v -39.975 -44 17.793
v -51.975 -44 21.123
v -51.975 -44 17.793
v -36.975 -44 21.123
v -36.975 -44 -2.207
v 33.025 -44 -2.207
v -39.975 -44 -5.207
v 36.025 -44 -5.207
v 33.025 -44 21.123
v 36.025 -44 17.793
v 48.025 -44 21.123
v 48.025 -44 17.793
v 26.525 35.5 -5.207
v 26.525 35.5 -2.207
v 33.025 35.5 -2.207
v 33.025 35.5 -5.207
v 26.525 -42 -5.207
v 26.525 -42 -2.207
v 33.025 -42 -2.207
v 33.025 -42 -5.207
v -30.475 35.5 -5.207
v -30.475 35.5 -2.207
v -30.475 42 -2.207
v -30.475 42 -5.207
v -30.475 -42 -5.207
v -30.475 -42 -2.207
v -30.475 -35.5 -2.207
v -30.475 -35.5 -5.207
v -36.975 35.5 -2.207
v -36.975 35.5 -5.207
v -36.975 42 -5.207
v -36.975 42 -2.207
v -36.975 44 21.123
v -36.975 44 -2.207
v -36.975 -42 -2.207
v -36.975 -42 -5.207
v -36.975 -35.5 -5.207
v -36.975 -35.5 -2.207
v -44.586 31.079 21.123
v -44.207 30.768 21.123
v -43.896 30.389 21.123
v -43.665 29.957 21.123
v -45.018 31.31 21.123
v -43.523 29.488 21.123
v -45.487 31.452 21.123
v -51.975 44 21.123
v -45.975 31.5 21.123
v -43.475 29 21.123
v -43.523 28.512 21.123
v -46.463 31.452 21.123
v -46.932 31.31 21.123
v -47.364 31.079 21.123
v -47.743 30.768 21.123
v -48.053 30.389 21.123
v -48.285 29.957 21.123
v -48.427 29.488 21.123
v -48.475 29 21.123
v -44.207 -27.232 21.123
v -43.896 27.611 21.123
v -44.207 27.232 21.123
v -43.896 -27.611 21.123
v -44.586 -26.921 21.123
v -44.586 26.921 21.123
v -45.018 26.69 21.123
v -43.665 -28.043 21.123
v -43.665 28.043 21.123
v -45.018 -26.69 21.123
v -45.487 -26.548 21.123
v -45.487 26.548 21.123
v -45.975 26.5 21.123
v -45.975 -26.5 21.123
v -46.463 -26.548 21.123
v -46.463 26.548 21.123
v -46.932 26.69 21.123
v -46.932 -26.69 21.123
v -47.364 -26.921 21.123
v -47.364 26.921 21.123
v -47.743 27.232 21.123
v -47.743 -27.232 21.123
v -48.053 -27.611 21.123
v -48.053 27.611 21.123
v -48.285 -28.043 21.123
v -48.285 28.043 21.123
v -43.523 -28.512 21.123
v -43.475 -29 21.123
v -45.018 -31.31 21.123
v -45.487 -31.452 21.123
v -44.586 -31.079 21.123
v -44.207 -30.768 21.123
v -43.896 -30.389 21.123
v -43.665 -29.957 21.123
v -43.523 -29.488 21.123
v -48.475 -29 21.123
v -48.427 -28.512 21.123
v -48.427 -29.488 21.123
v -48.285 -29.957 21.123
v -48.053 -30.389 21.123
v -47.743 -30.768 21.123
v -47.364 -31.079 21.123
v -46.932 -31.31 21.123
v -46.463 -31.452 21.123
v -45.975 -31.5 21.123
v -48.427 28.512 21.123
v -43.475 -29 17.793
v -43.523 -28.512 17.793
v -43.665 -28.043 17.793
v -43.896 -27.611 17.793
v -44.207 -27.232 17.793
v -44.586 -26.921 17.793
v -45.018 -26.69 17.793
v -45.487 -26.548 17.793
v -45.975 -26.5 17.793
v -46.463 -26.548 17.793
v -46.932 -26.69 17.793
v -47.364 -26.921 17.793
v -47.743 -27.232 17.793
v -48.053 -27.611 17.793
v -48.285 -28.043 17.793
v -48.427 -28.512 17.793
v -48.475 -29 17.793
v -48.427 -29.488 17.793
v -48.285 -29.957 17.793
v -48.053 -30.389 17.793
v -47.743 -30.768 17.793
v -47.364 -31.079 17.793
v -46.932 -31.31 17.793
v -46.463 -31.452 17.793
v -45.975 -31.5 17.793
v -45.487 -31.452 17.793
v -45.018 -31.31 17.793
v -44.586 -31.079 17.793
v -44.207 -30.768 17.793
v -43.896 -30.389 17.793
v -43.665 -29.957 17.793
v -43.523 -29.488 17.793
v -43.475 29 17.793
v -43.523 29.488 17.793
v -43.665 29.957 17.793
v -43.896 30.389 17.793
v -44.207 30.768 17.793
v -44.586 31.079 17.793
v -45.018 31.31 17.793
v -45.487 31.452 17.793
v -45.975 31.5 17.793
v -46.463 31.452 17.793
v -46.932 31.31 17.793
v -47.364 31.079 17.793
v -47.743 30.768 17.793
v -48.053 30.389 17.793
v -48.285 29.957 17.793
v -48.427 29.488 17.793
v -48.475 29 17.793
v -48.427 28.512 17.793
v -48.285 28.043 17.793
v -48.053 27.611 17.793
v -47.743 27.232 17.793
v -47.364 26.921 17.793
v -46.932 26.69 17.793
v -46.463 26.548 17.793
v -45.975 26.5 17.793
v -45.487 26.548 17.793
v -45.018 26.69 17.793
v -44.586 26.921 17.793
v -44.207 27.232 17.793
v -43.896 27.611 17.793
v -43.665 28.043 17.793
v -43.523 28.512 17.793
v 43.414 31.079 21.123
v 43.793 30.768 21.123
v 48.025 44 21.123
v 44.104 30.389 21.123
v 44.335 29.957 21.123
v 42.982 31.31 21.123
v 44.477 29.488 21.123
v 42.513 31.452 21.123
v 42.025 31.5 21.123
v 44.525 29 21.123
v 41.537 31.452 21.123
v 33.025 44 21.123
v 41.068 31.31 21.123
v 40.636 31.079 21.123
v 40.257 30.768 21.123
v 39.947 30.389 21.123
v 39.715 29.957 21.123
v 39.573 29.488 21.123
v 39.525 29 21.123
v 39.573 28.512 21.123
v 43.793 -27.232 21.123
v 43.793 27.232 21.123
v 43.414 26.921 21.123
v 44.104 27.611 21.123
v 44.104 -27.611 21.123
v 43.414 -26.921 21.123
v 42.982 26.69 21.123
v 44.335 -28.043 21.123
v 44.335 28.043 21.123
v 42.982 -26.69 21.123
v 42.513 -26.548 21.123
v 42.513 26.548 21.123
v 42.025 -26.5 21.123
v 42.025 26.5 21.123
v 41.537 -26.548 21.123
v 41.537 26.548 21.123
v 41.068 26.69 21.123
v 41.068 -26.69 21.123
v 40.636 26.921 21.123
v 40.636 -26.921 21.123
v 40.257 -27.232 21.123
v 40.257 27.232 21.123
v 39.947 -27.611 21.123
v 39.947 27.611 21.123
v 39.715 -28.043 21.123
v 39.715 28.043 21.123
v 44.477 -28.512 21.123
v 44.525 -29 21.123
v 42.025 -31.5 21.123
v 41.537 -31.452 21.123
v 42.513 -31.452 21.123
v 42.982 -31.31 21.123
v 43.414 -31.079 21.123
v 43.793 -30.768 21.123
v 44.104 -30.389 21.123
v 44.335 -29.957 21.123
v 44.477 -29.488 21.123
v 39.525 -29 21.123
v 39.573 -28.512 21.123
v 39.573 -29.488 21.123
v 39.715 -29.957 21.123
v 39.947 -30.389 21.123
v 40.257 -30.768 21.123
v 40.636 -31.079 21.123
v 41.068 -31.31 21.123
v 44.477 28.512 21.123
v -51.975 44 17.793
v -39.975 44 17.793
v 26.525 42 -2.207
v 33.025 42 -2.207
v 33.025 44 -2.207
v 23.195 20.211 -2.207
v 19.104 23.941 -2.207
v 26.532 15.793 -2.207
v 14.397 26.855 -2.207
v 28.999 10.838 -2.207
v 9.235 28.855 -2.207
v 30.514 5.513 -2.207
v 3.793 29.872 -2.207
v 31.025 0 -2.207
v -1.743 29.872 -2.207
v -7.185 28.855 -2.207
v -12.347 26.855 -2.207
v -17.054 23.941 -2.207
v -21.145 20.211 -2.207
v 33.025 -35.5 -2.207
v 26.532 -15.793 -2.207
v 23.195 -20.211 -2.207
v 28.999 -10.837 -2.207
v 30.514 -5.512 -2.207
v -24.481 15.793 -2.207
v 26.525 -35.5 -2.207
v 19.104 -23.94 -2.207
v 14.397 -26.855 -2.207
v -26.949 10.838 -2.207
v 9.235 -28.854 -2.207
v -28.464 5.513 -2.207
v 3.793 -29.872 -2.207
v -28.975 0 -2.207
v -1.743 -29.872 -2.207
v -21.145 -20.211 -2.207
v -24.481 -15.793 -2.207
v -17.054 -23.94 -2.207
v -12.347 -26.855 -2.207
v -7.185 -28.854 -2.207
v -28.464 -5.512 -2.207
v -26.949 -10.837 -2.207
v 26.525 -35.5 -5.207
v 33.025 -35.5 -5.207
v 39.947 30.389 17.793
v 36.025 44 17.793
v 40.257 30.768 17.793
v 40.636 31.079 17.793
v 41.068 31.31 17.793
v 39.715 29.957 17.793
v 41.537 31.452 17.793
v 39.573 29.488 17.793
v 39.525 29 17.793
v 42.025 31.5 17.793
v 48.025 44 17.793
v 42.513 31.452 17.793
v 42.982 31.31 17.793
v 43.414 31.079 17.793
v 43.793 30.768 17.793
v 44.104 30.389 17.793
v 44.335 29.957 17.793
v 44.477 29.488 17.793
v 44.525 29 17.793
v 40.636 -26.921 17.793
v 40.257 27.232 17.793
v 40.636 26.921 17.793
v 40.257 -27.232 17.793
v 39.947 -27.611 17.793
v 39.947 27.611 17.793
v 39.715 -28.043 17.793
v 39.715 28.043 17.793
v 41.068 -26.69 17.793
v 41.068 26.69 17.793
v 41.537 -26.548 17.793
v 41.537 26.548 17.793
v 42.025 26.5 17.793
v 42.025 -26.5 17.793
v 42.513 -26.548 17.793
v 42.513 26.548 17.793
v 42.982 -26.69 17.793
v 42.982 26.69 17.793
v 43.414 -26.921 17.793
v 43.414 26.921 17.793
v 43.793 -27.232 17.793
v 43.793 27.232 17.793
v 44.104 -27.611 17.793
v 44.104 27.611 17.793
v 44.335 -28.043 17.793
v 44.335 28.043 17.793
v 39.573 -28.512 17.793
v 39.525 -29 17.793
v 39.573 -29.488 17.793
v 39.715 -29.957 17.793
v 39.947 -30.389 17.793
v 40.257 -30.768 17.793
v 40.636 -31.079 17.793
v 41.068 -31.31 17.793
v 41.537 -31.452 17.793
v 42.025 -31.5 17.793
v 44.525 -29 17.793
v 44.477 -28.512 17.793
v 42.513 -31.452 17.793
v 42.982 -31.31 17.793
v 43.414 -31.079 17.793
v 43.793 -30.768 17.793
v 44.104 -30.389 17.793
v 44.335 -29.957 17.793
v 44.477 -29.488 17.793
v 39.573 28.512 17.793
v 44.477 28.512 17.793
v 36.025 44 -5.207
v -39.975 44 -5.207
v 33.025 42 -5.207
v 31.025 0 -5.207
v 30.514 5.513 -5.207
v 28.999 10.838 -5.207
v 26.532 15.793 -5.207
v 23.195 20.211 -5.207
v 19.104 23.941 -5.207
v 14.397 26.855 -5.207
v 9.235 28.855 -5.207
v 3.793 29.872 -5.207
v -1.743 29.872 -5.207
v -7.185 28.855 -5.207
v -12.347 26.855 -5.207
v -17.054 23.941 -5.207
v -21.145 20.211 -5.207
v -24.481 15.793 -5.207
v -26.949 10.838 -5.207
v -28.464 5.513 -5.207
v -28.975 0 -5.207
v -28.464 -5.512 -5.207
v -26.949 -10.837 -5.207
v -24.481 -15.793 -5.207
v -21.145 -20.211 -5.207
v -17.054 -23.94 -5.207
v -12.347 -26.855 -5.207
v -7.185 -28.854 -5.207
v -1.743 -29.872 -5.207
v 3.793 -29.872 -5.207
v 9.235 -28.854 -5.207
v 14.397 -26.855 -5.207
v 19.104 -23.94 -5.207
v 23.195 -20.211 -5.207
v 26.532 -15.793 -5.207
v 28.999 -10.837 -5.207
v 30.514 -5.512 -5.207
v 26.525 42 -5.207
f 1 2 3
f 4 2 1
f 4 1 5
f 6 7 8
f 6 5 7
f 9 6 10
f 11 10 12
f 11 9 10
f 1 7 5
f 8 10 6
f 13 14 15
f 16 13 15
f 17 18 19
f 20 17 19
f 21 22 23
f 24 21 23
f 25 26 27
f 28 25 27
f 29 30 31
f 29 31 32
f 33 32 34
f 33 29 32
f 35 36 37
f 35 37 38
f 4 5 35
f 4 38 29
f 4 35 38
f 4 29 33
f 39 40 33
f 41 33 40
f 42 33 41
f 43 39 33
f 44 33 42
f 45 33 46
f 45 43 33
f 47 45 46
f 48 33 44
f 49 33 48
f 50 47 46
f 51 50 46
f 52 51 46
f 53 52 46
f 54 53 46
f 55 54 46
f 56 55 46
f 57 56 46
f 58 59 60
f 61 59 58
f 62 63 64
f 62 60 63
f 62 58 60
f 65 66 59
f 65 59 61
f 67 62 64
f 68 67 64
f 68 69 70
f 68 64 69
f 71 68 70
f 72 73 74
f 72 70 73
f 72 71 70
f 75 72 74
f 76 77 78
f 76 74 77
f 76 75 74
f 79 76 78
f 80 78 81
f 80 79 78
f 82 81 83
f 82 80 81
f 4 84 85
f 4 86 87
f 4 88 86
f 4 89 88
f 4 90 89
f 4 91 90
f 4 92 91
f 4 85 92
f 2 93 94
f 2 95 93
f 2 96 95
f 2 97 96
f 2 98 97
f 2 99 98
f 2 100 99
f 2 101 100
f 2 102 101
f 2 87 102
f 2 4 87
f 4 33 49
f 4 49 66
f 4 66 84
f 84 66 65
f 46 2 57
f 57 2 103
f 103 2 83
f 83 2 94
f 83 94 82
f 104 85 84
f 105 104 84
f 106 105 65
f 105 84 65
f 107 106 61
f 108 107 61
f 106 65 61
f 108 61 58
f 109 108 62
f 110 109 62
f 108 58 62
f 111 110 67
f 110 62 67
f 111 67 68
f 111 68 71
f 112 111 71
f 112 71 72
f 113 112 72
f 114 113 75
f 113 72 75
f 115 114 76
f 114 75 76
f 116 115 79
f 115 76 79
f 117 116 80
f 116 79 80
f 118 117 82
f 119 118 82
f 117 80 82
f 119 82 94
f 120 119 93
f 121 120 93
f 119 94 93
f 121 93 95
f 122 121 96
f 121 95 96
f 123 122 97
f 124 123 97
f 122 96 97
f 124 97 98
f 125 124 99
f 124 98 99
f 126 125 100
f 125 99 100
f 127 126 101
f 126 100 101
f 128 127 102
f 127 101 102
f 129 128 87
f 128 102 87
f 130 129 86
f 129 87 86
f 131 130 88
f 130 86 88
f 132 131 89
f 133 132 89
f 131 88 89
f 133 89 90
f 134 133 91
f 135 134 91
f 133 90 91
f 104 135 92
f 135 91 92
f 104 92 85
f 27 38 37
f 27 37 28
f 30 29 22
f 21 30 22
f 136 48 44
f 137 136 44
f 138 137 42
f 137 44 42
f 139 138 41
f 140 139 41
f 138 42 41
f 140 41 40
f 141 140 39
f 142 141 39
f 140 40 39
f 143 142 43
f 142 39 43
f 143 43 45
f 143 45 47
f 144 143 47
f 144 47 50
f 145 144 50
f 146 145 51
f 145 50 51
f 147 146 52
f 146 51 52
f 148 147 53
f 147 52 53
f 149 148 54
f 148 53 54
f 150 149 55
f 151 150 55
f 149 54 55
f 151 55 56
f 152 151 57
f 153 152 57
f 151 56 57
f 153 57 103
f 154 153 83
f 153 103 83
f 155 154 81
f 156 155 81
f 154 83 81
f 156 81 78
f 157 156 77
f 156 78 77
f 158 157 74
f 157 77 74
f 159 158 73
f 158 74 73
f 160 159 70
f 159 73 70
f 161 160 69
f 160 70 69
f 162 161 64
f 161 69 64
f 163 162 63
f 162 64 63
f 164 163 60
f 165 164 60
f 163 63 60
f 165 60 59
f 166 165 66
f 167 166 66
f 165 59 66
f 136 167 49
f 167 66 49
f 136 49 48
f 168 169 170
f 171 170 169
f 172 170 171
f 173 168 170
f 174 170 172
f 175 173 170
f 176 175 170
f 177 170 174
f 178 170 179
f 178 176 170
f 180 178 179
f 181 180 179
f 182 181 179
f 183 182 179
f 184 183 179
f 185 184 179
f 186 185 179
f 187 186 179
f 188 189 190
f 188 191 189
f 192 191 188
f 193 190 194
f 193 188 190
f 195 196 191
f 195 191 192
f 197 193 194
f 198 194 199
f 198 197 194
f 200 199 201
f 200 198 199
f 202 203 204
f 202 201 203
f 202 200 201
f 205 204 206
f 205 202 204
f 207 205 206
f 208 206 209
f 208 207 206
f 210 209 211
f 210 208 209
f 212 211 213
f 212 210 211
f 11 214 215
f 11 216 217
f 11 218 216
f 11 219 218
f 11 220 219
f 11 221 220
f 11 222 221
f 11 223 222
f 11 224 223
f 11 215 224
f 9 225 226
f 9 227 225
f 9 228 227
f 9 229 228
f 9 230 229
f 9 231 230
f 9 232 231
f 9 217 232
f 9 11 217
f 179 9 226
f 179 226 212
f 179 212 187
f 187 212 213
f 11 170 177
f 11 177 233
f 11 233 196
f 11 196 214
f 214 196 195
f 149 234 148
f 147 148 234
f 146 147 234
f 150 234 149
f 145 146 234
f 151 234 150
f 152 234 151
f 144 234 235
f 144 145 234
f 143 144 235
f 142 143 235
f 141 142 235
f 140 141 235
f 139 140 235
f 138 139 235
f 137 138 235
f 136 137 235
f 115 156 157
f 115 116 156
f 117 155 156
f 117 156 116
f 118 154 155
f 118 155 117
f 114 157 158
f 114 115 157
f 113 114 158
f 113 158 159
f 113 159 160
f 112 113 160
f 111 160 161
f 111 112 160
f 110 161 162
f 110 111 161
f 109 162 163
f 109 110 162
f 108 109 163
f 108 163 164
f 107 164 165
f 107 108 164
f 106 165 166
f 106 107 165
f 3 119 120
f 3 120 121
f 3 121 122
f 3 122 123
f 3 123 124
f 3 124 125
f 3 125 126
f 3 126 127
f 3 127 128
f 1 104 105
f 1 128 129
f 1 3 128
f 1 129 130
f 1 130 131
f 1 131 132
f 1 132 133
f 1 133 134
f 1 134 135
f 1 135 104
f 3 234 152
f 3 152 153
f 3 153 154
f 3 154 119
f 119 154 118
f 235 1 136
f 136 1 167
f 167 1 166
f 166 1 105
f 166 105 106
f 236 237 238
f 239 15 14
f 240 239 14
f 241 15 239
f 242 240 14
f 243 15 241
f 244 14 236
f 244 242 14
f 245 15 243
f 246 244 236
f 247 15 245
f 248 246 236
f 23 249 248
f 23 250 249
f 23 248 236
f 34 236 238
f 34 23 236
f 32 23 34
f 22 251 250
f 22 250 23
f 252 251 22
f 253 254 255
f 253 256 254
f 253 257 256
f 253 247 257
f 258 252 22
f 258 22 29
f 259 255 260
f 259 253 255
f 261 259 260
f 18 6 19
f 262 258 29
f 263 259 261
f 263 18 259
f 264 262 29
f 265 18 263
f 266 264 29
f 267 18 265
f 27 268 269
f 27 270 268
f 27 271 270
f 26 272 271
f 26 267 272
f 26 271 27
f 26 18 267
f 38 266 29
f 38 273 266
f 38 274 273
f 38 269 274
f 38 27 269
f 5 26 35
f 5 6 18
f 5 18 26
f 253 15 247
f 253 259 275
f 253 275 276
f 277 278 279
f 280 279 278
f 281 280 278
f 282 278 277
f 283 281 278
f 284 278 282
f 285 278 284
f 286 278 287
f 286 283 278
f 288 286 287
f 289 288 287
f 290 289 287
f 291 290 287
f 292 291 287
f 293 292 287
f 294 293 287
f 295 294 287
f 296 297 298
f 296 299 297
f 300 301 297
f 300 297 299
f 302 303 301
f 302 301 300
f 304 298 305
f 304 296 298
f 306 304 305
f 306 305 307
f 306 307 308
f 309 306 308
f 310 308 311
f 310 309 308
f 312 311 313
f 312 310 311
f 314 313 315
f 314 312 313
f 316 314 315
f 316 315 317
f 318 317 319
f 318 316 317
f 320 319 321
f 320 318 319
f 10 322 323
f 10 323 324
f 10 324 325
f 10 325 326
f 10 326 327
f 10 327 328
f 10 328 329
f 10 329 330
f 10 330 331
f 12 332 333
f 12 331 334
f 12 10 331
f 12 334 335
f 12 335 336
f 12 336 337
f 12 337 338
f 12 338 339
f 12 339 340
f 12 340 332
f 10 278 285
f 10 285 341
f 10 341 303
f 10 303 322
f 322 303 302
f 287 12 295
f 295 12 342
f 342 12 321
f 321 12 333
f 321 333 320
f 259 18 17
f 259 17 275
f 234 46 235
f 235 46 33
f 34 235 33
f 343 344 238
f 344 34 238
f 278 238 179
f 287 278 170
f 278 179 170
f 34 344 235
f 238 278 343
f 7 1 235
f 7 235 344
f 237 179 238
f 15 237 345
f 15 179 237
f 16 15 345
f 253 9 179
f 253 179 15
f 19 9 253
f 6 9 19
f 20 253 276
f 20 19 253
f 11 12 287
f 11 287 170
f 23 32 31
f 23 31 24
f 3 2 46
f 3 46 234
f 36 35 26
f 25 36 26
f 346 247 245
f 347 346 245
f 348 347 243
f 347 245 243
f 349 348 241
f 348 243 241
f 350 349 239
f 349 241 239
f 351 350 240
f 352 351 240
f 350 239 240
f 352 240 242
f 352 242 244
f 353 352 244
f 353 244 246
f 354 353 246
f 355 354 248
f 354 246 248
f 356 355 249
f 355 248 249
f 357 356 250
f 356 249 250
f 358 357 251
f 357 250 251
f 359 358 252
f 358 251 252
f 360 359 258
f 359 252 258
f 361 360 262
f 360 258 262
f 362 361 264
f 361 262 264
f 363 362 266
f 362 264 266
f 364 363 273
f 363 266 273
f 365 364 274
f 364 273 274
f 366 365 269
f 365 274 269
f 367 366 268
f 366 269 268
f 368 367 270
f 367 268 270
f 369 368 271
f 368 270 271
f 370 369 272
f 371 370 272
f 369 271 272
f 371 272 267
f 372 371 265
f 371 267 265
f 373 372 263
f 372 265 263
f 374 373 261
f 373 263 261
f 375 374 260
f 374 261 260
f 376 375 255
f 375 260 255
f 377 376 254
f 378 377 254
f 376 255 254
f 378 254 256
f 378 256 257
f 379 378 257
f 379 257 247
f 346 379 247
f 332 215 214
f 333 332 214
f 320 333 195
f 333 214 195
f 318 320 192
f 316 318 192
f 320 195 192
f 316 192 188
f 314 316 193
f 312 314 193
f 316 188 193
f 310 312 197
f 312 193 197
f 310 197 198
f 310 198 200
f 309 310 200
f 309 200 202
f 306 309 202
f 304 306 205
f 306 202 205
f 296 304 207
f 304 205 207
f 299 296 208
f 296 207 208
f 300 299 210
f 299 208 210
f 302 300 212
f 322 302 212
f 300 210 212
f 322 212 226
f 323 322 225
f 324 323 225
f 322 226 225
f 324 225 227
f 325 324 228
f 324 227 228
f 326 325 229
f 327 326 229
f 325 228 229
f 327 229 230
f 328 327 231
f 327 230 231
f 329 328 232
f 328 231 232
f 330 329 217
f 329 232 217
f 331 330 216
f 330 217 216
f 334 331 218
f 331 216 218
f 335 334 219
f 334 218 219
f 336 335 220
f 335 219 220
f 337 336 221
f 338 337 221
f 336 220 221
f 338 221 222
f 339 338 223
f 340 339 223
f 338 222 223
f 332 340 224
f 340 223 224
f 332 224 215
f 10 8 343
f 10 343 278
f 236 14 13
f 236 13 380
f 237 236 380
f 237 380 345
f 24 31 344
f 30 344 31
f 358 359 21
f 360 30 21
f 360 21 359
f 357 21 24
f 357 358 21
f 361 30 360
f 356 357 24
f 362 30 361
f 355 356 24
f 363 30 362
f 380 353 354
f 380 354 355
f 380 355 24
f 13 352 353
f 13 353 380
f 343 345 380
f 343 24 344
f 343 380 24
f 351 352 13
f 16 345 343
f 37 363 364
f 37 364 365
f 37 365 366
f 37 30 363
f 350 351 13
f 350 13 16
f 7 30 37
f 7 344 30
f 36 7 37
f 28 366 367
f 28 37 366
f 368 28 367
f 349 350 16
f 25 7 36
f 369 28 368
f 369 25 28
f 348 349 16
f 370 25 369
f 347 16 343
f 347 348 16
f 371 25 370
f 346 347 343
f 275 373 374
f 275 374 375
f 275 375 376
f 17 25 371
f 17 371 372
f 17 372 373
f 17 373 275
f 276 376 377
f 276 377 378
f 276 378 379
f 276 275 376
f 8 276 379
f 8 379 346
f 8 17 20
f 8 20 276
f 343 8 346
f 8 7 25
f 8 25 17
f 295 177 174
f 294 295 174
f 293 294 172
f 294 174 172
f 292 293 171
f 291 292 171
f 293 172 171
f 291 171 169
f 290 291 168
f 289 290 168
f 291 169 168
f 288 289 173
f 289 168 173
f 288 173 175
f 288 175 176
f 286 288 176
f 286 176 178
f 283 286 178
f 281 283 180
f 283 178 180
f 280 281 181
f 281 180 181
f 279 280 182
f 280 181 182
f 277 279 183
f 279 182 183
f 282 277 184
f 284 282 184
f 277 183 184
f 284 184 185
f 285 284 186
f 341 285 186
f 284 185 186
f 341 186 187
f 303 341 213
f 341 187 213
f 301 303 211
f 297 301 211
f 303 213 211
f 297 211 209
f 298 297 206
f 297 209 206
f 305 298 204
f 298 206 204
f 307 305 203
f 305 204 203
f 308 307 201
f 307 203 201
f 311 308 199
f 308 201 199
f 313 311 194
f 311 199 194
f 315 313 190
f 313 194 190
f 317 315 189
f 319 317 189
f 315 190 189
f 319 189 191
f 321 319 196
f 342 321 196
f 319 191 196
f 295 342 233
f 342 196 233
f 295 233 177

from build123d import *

# Parameters (mm, degrees)
F1_DEPTH = 44
F2_R     = 2.5
F3_DEPTH = 3.330463
F4_R     = 30
F5_DEPTH = 3
F6_W     = 6.5
F6_H     = 6.5
F7_DEPTH = 3


with BuildPart() as f1:
    # F0 (on Front) → F1 (new body, symmetric)
    with BuildSketch(Plane.XZ):
        Polygon((33.025175, -2.207002), (-1.974825, -2.207002), (-1.974825, -5.207002), (36.025175, -5.207002), (36.025175, 17.792998), (48.025175, 17.792998), (48.025175, 21.123461), (33.025175, 21.123461), align=None)
        Polygon((-1.974825, -5.207002), (-1.974825, -2.207002), (-36.974825, -2.207002), (-36.974825, 21.123461), (-51.974825, 21.123461), (-51.974825, 17.792998), (-39.974825, 17.792998), (-39.974825, -5.207002), align=None)
    extrude(amount=F1_DEPTH, both=True)

    # F2 (on face) → F3 (cut, through all)
    with BuildSketch(Plane.XY.offset(21.123461)):
        with Locations((42.025175, -29)):
            Circle(F2_R)
        with Locations((42.025175, 29)):
            Circle(F2_R)
        with Locations((-45.974825, 29)):
            Circle(F2_R)
        with Locations((-45.974825, -29)):
            Circle(F2_R)
    extrude(amount=-F3_DEPTH, mode=Mode.SUBTRACT)

    # F4 (on face) → F5 (cut, through all)
    with BuildSketch(Plane.XY.offset(-2.207002)):
        with Locations((1.025122, 0.000286)):
            Circle(F4_R)
    extrude(amount=-F5_DEPTH, mode=Mode.SUBTRACT)

    # F6 (on face) → F7 (cut, through all)
    with BuildSketch(Plane.XY.offset(-2.207002)):
        with Locations((-33.724825, 38.75)):
            Rectangle(F6_W, F6_H)
        with Locations((29.775175, 38.75)):
            Rectangle(F6_W, F6_H)
        with Locations((29.775175, -38.75)):
            Rectangle(F6_W, F6_H)
        with Locations((-33.724825, -38.75)):
            Rectangle(F6_W, F6_H)
    extrude(amount=-F7_DEPTH, mode=Mode.SUBTRACT)


solid = f1.part
